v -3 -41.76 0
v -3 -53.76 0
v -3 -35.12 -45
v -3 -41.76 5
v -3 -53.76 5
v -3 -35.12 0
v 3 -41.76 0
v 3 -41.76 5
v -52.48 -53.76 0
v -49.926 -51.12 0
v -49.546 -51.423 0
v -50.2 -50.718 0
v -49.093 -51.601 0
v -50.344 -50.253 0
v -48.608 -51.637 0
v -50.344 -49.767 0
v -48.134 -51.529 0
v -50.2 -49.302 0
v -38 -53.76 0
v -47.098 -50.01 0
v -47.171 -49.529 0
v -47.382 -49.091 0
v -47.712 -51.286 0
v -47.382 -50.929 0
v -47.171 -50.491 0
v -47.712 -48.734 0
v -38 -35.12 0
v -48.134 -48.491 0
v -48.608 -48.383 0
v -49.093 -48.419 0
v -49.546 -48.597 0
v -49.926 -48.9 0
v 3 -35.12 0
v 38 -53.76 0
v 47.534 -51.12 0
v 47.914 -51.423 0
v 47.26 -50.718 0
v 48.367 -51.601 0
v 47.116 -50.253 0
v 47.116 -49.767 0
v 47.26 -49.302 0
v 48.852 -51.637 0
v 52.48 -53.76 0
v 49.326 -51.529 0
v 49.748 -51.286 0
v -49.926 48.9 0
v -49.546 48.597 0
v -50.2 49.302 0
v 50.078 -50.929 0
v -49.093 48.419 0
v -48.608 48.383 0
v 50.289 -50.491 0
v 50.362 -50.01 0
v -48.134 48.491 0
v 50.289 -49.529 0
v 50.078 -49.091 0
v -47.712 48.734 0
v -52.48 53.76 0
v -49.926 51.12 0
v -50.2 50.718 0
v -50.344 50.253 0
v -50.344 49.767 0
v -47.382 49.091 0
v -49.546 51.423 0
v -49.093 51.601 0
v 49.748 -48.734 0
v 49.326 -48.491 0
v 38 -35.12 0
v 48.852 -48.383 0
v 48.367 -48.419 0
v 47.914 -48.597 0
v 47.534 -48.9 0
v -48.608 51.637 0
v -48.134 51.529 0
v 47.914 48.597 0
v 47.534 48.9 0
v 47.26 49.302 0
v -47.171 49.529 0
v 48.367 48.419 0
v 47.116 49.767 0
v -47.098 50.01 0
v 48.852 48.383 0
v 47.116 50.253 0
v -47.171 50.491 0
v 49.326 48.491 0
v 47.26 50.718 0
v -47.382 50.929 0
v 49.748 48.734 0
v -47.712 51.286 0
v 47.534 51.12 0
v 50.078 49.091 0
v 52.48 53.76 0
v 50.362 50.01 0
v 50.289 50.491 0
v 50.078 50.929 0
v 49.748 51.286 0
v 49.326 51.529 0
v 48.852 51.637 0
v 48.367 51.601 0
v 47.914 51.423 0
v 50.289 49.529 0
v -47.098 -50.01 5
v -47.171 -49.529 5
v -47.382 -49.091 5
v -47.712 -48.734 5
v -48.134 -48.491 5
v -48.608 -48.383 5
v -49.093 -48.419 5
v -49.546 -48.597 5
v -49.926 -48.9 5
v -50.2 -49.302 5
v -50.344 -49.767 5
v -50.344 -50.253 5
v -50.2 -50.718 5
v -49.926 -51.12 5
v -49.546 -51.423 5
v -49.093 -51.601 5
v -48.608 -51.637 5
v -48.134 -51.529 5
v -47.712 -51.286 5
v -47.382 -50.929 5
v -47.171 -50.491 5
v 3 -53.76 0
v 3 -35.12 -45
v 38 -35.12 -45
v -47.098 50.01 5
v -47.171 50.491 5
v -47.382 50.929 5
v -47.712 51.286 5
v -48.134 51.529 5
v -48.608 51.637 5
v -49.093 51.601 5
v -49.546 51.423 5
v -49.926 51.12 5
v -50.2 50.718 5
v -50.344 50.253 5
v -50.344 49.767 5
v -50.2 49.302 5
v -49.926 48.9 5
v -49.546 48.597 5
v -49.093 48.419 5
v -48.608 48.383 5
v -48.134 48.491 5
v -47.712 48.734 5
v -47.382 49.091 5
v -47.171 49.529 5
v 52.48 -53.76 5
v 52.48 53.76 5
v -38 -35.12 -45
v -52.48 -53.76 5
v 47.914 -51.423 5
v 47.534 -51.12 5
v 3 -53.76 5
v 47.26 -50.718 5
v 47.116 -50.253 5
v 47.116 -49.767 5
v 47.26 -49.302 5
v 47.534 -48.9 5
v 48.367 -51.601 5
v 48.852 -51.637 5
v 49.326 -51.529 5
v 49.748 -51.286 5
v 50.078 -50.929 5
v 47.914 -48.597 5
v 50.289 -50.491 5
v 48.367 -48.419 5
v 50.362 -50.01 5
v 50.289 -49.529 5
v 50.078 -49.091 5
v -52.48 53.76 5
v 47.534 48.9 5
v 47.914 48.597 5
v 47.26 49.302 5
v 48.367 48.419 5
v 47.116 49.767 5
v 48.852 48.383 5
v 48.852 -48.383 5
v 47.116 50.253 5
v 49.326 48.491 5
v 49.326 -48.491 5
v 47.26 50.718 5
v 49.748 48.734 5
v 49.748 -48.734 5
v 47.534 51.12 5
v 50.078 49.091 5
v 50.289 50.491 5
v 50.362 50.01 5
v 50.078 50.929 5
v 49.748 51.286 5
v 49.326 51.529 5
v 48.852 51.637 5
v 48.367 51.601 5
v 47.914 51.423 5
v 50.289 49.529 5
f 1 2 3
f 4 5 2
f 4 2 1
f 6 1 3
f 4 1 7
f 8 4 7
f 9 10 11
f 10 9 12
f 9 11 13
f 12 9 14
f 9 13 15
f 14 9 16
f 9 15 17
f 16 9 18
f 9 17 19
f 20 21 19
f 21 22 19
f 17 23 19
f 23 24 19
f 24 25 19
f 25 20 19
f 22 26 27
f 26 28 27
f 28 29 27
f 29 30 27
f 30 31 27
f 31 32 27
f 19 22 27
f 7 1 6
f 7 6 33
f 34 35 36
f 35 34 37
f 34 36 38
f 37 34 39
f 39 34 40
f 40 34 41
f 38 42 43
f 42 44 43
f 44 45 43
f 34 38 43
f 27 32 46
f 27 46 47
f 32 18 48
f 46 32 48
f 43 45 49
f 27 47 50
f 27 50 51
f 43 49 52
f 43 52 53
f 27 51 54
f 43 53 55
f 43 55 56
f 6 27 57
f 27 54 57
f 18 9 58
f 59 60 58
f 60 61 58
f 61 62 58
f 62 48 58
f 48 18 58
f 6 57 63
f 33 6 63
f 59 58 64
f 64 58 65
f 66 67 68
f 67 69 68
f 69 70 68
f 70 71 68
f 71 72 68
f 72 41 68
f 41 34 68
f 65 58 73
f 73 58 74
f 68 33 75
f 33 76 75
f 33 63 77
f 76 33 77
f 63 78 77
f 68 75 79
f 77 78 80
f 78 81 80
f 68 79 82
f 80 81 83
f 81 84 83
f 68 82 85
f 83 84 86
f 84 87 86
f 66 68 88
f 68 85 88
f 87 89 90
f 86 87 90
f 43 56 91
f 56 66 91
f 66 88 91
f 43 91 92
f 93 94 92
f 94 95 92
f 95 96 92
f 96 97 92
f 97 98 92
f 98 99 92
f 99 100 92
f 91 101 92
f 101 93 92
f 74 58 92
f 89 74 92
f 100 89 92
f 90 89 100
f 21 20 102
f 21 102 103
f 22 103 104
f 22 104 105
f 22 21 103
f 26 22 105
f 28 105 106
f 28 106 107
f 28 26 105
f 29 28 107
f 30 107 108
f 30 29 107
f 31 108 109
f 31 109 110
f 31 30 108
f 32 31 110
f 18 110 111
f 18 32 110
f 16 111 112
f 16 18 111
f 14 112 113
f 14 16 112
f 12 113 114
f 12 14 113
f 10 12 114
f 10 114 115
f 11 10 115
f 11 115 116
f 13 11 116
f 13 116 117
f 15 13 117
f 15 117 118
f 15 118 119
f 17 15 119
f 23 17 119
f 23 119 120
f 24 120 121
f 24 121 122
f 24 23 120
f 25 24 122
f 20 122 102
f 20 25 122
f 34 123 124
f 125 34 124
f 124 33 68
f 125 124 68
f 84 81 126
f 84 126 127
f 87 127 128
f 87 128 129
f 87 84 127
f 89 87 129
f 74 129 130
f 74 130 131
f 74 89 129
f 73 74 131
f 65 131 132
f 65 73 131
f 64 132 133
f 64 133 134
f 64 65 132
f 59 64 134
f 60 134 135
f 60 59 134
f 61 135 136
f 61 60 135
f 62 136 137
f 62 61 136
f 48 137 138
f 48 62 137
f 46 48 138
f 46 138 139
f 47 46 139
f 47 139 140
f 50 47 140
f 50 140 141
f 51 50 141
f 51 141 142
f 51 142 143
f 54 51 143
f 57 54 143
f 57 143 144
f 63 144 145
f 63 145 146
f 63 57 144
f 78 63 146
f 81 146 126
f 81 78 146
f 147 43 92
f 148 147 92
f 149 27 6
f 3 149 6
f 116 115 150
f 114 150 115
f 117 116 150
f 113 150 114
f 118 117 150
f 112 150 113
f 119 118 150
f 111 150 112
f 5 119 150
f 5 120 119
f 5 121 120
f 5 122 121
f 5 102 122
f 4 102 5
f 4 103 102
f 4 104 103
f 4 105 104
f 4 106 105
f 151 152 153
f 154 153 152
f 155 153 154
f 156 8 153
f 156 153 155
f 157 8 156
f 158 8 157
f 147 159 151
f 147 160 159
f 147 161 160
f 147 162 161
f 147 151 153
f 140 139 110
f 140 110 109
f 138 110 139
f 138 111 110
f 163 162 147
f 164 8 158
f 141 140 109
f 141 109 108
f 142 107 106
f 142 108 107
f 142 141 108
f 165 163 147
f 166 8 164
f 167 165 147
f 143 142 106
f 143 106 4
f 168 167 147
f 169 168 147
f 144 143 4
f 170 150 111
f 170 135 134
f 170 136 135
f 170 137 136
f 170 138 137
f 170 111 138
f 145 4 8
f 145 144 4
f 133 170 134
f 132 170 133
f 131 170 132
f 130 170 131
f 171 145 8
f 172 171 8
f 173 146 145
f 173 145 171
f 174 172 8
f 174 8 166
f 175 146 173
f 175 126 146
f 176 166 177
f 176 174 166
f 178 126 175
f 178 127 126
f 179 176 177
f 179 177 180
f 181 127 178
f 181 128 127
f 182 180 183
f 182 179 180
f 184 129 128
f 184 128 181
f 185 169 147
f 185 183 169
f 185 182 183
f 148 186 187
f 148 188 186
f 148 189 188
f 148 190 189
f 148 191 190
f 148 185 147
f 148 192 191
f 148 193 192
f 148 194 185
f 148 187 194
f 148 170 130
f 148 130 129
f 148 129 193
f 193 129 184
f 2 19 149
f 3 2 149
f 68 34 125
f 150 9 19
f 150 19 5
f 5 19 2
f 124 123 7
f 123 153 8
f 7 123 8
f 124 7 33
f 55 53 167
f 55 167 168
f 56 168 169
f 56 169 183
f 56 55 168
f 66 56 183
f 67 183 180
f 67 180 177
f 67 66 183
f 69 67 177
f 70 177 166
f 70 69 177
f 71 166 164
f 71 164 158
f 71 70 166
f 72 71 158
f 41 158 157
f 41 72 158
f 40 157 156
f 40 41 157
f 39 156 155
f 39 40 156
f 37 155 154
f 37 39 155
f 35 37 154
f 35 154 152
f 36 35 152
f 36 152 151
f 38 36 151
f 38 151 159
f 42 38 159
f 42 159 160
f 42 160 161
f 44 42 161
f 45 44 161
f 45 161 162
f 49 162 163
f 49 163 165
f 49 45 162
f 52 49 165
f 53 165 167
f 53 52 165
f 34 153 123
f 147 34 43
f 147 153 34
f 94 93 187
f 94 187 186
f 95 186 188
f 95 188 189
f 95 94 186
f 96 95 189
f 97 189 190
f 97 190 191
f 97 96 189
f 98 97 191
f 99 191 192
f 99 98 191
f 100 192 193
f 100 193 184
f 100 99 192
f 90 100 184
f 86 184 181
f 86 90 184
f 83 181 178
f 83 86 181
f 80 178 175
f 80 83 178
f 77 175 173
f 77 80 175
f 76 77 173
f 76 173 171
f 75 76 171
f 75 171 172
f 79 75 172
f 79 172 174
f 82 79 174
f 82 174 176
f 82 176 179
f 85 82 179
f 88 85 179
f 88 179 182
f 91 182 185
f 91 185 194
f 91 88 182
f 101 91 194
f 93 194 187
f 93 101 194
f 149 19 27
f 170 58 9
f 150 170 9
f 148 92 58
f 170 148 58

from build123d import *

# Parameters (mm, degrees)
F0_R     = 1.63195
F1_DEPTH = 5
F2_W     = 35
F2_H     = 18.64
F3_DEPTH = 50
F5_DEPTH = 90.481


with BuildPart() as f1:
    # F0 (on Top) → F1 (new body)
    with BuildSketch(Plane.XY):
        Polygon((-52.48, 53.76), (-52.48, -53.76), (-3, -53.76), (-3, -41.76), (3, -41.76), (3, -53.76), (52.48, -53.76), (52.48, 53.76), align=None)
        with Locations((-48.73, -50.01)):
            Circle(F0_R, mode=Mode.SUBTRACT)
        with Locations((48.73, -50.01)):
            Circle(F0_R, mode=Mode.SUBTRACT)
        with Locations((-48.73, 50.01)):
            Circle(F0_R, mode=Mode.SUBTRACT)
        with Locations((48.73, 50.01)):
            Circle(F0_R, mode=Mode.SUBTRACT)
    extrude(amount=F1_DEPTH)

    # F2 (on face) → F3 (join)
    with BuildSketch(Plane.XY.offset(5)):
        with Locations((20.5, -44.44)):
            Rectangle(F2_W, F2_H)
        with Locations((-20.5, -44.44)):
            Rectangle(F2_W, F2_H)
    extrude(amount=-F3_DEPTH)

    # F4 (on face) → F5 (cut, through all)
    with BuildSketch(Plane(origin=(-38, 0, 0), x_dir=(0, -1, 0), z_dir=(-1, 0, 0))):
        Polygon((53.76, -45), (53.76, 0), (35.1203896932, -45), align=None)
    extrude(amount=-F5_DEPTH, mode=Mode.SUBTRACT)


solid = f1.part
